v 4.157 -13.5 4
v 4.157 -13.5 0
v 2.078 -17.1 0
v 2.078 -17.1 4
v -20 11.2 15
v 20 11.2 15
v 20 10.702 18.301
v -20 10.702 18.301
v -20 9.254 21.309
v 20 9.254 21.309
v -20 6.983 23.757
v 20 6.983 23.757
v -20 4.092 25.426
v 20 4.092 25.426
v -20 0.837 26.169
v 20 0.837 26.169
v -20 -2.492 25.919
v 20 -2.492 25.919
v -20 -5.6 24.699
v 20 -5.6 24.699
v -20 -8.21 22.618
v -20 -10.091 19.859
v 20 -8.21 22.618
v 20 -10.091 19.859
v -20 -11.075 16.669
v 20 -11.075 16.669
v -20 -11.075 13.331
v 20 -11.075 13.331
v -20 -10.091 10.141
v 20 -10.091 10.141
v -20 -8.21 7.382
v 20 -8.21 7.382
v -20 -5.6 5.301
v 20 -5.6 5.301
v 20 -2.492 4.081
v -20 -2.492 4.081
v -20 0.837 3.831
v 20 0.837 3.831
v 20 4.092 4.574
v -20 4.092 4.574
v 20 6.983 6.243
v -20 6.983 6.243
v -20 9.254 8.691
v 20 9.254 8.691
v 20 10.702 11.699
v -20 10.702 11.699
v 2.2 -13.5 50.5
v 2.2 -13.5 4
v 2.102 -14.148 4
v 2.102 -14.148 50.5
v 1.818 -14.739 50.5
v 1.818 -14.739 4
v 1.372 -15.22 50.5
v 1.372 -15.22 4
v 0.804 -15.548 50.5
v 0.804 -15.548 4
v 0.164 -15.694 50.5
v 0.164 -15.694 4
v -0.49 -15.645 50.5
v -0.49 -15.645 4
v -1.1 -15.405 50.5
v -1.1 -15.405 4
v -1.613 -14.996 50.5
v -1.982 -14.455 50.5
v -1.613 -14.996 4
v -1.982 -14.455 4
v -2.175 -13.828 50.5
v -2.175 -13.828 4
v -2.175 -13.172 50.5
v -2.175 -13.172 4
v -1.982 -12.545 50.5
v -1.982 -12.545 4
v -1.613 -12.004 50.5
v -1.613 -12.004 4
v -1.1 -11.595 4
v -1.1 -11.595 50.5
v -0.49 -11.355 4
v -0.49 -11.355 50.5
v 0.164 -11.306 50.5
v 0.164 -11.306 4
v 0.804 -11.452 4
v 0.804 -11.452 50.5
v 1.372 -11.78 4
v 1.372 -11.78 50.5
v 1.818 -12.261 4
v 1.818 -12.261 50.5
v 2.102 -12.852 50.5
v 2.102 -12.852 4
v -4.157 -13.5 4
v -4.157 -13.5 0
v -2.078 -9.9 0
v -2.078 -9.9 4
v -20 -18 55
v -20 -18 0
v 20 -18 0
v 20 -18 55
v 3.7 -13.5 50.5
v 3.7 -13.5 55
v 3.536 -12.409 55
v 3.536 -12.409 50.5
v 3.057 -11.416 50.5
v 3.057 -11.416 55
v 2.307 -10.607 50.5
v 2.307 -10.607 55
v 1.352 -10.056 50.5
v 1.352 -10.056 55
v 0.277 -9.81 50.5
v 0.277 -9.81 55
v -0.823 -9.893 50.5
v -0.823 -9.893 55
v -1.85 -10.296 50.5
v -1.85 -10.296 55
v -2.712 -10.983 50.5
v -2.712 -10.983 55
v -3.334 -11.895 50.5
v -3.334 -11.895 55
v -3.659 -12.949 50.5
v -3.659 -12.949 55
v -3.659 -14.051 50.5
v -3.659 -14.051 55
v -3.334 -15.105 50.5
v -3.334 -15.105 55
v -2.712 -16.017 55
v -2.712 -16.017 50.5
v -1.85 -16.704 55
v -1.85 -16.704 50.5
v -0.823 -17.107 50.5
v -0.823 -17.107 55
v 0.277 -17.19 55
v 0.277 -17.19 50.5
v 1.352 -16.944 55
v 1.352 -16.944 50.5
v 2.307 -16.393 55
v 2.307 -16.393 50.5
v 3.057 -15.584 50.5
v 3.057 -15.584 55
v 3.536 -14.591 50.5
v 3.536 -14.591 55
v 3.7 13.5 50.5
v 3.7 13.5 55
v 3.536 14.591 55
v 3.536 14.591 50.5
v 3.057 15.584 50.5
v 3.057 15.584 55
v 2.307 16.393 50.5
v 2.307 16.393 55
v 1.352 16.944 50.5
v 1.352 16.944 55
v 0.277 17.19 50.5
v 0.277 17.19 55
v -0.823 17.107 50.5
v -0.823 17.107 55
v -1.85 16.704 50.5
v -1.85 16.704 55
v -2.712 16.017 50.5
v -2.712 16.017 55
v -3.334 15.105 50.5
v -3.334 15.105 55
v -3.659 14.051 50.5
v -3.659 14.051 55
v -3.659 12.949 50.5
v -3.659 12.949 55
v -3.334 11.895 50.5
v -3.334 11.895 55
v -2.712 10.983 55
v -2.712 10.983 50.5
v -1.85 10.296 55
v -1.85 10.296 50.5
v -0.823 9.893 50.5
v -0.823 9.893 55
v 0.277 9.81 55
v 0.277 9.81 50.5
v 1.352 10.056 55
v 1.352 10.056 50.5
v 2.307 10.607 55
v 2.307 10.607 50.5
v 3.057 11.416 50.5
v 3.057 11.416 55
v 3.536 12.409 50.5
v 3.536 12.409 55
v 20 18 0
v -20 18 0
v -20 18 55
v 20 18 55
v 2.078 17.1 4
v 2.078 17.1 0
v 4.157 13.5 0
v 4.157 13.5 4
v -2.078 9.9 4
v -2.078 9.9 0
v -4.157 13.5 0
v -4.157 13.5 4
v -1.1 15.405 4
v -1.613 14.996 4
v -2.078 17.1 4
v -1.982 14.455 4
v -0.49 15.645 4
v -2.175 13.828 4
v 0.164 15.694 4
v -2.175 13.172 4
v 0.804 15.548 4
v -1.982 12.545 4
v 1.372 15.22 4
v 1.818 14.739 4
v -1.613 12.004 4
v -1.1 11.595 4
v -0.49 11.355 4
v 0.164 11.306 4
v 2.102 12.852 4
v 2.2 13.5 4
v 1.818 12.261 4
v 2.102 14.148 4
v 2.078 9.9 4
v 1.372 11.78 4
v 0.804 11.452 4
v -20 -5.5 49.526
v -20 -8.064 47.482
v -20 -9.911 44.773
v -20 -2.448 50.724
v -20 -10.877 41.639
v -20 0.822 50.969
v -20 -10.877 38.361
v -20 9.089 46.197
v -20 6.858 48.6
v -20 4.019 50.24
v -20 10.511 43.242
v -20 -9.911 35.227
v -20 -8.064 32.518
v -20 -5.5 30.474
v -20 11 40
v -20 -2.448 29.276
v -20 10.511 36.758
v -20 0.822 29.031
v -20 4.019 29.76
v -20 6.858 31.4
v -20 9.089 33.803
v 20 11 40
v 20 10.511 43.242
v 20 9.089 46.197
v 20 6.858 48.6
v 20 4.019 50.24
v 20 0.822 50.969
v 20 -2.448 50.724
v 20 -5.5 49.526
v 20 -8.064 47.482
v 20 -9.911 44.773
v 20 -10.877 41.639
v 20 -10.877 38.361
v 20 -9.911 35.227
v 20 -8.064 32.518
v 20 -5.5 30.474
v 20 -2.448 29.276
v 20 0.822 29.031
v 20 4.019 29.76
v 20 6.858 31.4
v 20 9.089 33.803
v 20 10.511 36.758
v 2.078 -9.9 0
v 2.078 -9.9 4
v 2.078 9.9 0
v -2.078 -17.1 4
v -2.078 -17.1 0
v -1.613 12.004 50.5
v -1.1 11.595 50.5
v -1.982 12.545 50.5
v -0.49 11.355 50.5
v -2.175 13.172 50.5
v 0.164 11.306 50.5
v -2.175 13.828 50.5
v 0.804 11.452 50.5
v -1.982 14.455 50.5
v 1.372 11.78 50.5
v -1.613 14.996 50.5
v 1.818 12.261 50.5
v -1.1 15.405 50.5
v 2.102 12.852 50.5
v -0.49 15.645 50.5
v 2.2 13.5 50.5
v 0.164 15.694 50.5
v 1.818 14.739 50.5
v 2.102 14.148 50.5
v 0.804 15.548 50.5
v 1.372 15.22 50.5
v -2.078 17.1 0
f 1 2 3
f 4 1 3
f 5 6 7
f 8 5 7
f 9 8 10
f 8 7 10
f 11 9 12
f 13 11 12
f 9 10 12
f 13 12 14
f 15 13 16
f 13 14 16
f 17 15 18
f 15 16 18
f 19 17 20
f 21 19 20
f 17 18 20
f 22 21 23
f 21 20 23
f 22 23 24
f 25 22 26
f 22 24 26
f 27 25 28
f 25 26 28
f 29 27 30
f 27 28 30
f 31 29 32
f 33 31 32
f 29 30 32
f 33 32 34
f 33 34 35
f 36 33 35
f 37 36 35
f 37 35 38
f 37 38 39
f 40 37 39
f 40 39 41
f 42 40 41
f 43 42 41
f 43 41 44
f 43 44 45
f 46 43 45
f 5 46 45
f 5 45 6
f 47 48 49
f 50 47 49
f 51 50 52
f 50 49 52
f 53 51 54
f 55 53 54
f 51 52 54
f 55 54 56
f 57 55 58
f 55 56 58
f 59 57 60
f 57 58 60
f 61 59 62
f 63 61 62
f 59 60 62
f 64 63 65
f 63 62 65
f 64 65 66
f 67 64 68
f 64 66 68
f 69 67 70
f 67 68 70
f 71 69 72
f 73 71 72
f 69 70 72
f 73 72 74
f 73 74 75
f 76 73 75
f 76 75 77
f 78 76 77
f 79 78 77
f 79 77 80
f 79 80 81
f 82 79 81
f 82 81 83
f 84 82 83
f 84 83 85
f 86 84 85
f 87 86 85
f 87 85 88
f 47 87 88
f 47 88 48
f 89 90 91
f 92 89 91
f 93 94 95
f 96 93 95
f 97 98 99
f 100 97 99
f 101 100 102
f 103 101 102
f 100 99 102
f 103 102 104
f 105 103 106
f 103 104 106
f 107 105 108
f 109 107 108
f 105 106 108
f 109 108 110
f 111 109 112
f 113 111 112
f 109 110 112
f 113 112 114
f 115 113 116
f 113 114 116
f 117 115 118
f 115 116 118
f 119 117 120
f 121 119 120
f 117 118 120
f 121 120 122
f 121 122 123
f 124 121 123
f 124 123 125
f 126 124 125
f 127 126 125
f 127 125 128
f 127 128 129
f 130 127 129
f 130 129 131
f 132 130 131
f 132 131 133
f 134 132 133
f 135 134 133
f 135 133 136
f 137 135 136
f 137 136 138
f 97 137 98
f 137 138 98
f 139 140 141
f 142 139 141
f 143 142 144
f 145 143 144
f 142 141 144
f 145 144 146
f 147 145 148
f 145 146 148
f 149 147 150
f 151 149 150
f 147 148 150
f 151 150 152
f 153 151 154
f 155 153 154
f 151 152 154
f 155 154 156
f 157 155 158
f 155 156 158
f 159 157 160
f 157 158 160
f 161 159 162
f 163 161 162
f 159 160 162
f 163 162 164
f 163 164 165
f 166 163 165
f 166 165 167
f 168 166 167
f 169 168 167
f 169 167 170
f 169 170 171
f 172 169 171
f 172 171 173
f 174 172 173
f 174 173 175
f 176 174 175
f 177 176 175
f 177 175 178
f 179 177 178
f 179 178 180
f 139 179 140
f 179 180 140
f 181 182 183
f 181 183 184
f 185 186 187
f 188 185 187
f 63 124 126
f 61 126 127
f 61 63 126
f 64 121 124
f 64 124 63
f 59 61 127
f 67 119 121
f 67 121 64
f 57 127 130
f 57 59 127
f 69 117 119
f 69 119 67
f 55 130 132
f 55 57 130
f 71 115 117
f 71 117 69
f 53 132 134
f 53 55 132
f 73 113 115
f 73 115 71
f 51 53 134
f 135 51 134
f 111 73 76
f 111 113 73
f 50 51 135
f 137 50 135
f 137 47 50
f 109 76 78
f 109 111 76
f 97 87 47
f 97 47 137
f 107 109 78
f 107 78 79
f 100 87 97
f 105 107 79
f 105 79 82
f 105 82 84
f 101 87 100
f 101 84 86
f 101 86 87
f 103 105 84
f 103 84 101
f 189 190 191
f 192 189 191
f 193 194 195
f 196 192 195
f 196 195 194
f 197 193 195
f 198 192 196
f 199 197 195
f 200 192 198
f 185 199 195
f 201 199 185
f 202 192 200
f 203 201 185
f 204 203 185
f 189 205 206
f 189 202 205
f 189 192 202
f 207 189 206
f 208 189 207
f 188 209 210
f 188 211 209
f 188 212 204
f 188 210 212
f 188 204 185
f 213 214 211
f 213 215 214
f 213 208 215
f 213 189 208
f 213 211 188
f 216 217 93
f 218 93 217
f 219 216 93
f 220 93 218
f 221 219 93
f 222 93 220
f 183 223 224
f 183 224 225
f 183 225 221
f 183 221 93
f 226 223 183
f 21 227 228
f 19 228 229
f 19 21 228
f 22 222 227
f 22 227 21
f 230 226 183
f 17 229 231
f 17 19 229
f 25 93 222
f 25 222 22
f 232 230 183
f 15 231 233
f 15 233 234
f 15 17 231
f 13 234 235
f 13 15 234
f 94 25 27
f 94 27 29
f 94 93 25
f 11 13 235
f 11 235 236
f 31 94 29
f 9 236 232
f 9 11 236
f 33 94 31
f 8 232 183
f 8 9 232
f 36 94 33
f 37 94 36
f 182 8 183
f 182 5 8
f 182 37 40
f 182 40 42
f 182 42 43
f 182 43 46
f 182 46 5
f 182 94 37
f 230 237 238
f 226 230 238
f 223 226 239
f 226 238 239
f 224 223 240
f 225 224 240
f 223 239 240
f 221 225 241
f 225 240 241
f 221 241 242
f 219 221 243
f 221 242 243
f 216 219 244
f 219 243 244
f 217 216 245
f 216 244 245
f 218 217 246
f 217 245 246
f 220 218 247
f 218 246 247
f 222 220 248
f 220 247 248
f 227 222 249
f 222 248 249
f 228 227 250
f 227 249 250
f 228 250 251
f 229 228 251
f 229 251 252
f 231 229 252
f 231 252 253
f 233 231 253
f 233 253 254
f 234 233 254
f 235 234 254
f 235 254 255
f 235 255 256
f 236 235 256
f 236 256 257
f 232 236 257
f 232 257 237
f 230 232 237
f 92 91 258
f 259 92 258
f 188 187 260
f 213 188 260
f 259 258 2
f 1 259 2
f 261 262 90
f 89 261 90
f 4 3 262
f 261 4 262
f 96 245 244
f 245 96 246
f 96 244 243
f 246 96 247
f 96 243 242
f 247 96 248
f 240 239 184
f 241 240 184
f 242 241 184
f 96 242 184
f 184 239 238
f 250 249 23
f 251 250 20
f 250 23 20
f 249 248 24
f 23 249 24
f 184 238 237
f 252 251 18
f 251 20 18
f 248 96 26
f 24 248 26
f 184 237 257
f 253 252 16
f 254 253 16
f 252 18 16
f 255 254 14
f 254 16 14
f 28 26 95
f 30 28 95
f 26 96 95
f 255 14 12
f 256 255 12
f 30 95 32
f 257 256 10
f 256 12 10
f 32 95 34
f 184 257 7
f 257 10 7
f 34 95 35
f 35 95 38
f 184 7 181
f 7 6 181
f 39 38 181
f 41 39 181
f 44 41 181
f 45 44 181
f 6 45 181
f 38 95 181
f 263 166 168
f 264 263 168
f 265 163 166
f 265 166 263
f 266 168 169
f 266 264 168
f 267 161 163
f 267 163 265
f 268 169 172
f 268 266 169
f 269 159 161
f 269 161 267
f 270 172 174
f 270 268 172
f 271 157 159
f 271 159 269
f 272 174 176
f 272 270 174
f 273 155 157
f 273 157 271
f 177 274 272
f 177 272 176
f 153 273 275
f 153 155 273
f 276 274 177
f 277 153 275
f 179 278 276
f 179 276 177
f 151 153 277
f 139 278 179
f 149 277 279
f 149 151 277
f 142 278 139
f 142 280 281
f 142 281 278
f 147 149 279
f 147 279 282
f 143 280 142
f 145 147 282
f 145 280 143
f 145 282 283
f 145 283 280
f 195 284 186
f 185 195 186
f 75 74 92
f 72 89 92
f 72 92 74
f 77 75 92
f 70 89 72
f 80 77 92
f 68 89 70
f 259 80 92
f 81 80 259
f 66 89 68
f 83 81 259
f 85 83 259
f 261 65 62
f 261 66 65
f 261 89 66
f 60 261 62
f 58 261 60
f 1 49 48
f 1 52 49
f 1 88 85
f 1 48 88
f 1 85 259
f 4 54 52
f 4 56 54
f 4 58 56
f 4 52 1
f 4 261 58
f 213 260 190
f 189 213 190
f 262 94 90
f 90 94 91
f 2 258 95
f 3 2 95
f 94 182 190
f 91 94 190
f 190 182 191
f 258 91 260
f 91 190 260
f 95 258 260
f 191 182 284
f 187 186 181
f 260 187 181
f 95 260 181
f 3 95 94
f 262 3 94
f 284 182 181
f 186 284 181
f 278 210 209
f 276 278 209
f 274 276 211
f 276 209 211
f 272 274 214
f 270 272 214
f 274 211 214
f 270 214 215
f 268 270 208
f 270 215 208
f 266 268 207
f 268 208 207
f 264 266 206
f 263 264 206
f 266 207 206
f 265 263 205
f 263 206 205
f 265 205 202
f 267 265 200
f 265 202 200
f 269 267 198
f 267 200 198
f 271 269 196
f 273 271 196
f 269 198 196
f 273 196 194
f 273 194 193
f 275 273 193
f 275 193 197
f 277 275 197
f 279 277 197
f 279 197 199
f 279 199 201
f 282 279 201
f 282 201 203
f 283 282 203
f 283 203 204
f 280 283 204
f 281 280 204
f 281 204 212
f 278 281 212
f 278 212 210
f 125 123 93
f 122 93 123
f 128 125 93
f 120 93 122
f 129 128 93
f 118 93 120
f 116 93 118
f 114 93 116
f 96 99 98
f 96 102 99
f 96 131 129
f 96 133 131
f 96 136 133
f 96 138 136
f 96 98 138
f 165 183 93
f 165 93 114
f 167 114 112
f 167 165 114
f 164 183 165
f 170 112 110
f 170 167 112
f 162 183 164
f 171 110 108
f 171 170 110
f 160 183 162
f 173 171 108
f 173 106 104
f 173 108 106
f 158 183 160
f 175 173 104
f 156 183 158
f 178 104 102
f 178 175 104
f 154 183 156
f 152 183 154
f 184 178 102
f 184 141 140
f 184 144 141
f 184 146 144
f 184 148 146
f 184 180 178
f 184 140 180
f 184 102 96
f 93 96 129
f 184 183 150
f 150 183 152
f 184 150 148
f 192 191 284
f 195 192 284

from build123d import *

# Parameters (mm, degrees)
SKETCH_W        = 40
SKETCH_H        = 36
PAD_DEPTH       = 55
SKETCH001_R     = 11.2
SKETCH001_R_2   = 11
POCKET_DEPTH    = 40.001
POCKET001_DEPTH = 4
SKETCH004_R     = 2.2
POCKET002_DEPTH = 51.001
SKETCH005_R     = 3.7
POCKET003_DEPTH = 4.5


with BuildPart() as part:
    # Sketch → Pad (new body)
    with BuildSketch(Plane.XY):
        Rectangle(SKETCH_W, SKETCH_H)
    extrude(amount=PAD_DEPTH)

    # Sketch001 → Pocket (cut, through all)
    with BuildSketch(Plane.YZ.offset(20)):
        with Locations((0, 15)):
            Circle(SKETCH001_R)
        with Locations((0, 40)):
            Circle(SKETCH001_R_2)
    extrude(amount=-POCKET_DEPTH, mode=Mode.SUBTRACT)

    # Sketch002 → Pocket001 (cut)
    with BuildSketch(Plane(origin=(0, 0, 0), x_dir=(1, 0, 0), z_dir=(0, 0, -1))):
        Polygon((2.078461, 9.9), (4.156922, 13.5), (2.078461, 17.1), (-2.078461, 17.1), (-4.156922, 13.5), (-2.078461, 9.9), align=None)
        Polygon((4.156922, -13.5), (2.078461, -9.9), (-2.078461, -9.9), (-4.156922, -13.5), (-2.078461, -17.1), (2.078461, -17.1), align=None)
    extrude(amount=-POCKET001_DEPTH, mode=Mode.SUBTRACT)

    # Sketch004 → Pocket002 (cut, through all)
    with BuildSketch(Plane(origin=(0, 0, 4), x_dir=(1, 0, 0), z_dir=(0, 0, -1))):
        with Locations((0, 13.5)):
            Circle(SKETCH004_R)
        with Locations((0, -13.5)):
            Circle(SKETCH004_R)
    extrude(amount=-POCKET002_DEPTH, mode=Mode.SUBTRACT)

    # Sketch005 → Pocket003 (cut)
    with BuildSketch(Plane.XY.offset(55)):
        with Locations((0, -13.5)):
            Circle(SKETCH005_R)
        with Locations((0, 13.5)):
            Circle(SKETCH005_R)
    extrude(amount=-POCKET003_DEPTH, mode=Mode.SUBTRACT)


solid = part.part
